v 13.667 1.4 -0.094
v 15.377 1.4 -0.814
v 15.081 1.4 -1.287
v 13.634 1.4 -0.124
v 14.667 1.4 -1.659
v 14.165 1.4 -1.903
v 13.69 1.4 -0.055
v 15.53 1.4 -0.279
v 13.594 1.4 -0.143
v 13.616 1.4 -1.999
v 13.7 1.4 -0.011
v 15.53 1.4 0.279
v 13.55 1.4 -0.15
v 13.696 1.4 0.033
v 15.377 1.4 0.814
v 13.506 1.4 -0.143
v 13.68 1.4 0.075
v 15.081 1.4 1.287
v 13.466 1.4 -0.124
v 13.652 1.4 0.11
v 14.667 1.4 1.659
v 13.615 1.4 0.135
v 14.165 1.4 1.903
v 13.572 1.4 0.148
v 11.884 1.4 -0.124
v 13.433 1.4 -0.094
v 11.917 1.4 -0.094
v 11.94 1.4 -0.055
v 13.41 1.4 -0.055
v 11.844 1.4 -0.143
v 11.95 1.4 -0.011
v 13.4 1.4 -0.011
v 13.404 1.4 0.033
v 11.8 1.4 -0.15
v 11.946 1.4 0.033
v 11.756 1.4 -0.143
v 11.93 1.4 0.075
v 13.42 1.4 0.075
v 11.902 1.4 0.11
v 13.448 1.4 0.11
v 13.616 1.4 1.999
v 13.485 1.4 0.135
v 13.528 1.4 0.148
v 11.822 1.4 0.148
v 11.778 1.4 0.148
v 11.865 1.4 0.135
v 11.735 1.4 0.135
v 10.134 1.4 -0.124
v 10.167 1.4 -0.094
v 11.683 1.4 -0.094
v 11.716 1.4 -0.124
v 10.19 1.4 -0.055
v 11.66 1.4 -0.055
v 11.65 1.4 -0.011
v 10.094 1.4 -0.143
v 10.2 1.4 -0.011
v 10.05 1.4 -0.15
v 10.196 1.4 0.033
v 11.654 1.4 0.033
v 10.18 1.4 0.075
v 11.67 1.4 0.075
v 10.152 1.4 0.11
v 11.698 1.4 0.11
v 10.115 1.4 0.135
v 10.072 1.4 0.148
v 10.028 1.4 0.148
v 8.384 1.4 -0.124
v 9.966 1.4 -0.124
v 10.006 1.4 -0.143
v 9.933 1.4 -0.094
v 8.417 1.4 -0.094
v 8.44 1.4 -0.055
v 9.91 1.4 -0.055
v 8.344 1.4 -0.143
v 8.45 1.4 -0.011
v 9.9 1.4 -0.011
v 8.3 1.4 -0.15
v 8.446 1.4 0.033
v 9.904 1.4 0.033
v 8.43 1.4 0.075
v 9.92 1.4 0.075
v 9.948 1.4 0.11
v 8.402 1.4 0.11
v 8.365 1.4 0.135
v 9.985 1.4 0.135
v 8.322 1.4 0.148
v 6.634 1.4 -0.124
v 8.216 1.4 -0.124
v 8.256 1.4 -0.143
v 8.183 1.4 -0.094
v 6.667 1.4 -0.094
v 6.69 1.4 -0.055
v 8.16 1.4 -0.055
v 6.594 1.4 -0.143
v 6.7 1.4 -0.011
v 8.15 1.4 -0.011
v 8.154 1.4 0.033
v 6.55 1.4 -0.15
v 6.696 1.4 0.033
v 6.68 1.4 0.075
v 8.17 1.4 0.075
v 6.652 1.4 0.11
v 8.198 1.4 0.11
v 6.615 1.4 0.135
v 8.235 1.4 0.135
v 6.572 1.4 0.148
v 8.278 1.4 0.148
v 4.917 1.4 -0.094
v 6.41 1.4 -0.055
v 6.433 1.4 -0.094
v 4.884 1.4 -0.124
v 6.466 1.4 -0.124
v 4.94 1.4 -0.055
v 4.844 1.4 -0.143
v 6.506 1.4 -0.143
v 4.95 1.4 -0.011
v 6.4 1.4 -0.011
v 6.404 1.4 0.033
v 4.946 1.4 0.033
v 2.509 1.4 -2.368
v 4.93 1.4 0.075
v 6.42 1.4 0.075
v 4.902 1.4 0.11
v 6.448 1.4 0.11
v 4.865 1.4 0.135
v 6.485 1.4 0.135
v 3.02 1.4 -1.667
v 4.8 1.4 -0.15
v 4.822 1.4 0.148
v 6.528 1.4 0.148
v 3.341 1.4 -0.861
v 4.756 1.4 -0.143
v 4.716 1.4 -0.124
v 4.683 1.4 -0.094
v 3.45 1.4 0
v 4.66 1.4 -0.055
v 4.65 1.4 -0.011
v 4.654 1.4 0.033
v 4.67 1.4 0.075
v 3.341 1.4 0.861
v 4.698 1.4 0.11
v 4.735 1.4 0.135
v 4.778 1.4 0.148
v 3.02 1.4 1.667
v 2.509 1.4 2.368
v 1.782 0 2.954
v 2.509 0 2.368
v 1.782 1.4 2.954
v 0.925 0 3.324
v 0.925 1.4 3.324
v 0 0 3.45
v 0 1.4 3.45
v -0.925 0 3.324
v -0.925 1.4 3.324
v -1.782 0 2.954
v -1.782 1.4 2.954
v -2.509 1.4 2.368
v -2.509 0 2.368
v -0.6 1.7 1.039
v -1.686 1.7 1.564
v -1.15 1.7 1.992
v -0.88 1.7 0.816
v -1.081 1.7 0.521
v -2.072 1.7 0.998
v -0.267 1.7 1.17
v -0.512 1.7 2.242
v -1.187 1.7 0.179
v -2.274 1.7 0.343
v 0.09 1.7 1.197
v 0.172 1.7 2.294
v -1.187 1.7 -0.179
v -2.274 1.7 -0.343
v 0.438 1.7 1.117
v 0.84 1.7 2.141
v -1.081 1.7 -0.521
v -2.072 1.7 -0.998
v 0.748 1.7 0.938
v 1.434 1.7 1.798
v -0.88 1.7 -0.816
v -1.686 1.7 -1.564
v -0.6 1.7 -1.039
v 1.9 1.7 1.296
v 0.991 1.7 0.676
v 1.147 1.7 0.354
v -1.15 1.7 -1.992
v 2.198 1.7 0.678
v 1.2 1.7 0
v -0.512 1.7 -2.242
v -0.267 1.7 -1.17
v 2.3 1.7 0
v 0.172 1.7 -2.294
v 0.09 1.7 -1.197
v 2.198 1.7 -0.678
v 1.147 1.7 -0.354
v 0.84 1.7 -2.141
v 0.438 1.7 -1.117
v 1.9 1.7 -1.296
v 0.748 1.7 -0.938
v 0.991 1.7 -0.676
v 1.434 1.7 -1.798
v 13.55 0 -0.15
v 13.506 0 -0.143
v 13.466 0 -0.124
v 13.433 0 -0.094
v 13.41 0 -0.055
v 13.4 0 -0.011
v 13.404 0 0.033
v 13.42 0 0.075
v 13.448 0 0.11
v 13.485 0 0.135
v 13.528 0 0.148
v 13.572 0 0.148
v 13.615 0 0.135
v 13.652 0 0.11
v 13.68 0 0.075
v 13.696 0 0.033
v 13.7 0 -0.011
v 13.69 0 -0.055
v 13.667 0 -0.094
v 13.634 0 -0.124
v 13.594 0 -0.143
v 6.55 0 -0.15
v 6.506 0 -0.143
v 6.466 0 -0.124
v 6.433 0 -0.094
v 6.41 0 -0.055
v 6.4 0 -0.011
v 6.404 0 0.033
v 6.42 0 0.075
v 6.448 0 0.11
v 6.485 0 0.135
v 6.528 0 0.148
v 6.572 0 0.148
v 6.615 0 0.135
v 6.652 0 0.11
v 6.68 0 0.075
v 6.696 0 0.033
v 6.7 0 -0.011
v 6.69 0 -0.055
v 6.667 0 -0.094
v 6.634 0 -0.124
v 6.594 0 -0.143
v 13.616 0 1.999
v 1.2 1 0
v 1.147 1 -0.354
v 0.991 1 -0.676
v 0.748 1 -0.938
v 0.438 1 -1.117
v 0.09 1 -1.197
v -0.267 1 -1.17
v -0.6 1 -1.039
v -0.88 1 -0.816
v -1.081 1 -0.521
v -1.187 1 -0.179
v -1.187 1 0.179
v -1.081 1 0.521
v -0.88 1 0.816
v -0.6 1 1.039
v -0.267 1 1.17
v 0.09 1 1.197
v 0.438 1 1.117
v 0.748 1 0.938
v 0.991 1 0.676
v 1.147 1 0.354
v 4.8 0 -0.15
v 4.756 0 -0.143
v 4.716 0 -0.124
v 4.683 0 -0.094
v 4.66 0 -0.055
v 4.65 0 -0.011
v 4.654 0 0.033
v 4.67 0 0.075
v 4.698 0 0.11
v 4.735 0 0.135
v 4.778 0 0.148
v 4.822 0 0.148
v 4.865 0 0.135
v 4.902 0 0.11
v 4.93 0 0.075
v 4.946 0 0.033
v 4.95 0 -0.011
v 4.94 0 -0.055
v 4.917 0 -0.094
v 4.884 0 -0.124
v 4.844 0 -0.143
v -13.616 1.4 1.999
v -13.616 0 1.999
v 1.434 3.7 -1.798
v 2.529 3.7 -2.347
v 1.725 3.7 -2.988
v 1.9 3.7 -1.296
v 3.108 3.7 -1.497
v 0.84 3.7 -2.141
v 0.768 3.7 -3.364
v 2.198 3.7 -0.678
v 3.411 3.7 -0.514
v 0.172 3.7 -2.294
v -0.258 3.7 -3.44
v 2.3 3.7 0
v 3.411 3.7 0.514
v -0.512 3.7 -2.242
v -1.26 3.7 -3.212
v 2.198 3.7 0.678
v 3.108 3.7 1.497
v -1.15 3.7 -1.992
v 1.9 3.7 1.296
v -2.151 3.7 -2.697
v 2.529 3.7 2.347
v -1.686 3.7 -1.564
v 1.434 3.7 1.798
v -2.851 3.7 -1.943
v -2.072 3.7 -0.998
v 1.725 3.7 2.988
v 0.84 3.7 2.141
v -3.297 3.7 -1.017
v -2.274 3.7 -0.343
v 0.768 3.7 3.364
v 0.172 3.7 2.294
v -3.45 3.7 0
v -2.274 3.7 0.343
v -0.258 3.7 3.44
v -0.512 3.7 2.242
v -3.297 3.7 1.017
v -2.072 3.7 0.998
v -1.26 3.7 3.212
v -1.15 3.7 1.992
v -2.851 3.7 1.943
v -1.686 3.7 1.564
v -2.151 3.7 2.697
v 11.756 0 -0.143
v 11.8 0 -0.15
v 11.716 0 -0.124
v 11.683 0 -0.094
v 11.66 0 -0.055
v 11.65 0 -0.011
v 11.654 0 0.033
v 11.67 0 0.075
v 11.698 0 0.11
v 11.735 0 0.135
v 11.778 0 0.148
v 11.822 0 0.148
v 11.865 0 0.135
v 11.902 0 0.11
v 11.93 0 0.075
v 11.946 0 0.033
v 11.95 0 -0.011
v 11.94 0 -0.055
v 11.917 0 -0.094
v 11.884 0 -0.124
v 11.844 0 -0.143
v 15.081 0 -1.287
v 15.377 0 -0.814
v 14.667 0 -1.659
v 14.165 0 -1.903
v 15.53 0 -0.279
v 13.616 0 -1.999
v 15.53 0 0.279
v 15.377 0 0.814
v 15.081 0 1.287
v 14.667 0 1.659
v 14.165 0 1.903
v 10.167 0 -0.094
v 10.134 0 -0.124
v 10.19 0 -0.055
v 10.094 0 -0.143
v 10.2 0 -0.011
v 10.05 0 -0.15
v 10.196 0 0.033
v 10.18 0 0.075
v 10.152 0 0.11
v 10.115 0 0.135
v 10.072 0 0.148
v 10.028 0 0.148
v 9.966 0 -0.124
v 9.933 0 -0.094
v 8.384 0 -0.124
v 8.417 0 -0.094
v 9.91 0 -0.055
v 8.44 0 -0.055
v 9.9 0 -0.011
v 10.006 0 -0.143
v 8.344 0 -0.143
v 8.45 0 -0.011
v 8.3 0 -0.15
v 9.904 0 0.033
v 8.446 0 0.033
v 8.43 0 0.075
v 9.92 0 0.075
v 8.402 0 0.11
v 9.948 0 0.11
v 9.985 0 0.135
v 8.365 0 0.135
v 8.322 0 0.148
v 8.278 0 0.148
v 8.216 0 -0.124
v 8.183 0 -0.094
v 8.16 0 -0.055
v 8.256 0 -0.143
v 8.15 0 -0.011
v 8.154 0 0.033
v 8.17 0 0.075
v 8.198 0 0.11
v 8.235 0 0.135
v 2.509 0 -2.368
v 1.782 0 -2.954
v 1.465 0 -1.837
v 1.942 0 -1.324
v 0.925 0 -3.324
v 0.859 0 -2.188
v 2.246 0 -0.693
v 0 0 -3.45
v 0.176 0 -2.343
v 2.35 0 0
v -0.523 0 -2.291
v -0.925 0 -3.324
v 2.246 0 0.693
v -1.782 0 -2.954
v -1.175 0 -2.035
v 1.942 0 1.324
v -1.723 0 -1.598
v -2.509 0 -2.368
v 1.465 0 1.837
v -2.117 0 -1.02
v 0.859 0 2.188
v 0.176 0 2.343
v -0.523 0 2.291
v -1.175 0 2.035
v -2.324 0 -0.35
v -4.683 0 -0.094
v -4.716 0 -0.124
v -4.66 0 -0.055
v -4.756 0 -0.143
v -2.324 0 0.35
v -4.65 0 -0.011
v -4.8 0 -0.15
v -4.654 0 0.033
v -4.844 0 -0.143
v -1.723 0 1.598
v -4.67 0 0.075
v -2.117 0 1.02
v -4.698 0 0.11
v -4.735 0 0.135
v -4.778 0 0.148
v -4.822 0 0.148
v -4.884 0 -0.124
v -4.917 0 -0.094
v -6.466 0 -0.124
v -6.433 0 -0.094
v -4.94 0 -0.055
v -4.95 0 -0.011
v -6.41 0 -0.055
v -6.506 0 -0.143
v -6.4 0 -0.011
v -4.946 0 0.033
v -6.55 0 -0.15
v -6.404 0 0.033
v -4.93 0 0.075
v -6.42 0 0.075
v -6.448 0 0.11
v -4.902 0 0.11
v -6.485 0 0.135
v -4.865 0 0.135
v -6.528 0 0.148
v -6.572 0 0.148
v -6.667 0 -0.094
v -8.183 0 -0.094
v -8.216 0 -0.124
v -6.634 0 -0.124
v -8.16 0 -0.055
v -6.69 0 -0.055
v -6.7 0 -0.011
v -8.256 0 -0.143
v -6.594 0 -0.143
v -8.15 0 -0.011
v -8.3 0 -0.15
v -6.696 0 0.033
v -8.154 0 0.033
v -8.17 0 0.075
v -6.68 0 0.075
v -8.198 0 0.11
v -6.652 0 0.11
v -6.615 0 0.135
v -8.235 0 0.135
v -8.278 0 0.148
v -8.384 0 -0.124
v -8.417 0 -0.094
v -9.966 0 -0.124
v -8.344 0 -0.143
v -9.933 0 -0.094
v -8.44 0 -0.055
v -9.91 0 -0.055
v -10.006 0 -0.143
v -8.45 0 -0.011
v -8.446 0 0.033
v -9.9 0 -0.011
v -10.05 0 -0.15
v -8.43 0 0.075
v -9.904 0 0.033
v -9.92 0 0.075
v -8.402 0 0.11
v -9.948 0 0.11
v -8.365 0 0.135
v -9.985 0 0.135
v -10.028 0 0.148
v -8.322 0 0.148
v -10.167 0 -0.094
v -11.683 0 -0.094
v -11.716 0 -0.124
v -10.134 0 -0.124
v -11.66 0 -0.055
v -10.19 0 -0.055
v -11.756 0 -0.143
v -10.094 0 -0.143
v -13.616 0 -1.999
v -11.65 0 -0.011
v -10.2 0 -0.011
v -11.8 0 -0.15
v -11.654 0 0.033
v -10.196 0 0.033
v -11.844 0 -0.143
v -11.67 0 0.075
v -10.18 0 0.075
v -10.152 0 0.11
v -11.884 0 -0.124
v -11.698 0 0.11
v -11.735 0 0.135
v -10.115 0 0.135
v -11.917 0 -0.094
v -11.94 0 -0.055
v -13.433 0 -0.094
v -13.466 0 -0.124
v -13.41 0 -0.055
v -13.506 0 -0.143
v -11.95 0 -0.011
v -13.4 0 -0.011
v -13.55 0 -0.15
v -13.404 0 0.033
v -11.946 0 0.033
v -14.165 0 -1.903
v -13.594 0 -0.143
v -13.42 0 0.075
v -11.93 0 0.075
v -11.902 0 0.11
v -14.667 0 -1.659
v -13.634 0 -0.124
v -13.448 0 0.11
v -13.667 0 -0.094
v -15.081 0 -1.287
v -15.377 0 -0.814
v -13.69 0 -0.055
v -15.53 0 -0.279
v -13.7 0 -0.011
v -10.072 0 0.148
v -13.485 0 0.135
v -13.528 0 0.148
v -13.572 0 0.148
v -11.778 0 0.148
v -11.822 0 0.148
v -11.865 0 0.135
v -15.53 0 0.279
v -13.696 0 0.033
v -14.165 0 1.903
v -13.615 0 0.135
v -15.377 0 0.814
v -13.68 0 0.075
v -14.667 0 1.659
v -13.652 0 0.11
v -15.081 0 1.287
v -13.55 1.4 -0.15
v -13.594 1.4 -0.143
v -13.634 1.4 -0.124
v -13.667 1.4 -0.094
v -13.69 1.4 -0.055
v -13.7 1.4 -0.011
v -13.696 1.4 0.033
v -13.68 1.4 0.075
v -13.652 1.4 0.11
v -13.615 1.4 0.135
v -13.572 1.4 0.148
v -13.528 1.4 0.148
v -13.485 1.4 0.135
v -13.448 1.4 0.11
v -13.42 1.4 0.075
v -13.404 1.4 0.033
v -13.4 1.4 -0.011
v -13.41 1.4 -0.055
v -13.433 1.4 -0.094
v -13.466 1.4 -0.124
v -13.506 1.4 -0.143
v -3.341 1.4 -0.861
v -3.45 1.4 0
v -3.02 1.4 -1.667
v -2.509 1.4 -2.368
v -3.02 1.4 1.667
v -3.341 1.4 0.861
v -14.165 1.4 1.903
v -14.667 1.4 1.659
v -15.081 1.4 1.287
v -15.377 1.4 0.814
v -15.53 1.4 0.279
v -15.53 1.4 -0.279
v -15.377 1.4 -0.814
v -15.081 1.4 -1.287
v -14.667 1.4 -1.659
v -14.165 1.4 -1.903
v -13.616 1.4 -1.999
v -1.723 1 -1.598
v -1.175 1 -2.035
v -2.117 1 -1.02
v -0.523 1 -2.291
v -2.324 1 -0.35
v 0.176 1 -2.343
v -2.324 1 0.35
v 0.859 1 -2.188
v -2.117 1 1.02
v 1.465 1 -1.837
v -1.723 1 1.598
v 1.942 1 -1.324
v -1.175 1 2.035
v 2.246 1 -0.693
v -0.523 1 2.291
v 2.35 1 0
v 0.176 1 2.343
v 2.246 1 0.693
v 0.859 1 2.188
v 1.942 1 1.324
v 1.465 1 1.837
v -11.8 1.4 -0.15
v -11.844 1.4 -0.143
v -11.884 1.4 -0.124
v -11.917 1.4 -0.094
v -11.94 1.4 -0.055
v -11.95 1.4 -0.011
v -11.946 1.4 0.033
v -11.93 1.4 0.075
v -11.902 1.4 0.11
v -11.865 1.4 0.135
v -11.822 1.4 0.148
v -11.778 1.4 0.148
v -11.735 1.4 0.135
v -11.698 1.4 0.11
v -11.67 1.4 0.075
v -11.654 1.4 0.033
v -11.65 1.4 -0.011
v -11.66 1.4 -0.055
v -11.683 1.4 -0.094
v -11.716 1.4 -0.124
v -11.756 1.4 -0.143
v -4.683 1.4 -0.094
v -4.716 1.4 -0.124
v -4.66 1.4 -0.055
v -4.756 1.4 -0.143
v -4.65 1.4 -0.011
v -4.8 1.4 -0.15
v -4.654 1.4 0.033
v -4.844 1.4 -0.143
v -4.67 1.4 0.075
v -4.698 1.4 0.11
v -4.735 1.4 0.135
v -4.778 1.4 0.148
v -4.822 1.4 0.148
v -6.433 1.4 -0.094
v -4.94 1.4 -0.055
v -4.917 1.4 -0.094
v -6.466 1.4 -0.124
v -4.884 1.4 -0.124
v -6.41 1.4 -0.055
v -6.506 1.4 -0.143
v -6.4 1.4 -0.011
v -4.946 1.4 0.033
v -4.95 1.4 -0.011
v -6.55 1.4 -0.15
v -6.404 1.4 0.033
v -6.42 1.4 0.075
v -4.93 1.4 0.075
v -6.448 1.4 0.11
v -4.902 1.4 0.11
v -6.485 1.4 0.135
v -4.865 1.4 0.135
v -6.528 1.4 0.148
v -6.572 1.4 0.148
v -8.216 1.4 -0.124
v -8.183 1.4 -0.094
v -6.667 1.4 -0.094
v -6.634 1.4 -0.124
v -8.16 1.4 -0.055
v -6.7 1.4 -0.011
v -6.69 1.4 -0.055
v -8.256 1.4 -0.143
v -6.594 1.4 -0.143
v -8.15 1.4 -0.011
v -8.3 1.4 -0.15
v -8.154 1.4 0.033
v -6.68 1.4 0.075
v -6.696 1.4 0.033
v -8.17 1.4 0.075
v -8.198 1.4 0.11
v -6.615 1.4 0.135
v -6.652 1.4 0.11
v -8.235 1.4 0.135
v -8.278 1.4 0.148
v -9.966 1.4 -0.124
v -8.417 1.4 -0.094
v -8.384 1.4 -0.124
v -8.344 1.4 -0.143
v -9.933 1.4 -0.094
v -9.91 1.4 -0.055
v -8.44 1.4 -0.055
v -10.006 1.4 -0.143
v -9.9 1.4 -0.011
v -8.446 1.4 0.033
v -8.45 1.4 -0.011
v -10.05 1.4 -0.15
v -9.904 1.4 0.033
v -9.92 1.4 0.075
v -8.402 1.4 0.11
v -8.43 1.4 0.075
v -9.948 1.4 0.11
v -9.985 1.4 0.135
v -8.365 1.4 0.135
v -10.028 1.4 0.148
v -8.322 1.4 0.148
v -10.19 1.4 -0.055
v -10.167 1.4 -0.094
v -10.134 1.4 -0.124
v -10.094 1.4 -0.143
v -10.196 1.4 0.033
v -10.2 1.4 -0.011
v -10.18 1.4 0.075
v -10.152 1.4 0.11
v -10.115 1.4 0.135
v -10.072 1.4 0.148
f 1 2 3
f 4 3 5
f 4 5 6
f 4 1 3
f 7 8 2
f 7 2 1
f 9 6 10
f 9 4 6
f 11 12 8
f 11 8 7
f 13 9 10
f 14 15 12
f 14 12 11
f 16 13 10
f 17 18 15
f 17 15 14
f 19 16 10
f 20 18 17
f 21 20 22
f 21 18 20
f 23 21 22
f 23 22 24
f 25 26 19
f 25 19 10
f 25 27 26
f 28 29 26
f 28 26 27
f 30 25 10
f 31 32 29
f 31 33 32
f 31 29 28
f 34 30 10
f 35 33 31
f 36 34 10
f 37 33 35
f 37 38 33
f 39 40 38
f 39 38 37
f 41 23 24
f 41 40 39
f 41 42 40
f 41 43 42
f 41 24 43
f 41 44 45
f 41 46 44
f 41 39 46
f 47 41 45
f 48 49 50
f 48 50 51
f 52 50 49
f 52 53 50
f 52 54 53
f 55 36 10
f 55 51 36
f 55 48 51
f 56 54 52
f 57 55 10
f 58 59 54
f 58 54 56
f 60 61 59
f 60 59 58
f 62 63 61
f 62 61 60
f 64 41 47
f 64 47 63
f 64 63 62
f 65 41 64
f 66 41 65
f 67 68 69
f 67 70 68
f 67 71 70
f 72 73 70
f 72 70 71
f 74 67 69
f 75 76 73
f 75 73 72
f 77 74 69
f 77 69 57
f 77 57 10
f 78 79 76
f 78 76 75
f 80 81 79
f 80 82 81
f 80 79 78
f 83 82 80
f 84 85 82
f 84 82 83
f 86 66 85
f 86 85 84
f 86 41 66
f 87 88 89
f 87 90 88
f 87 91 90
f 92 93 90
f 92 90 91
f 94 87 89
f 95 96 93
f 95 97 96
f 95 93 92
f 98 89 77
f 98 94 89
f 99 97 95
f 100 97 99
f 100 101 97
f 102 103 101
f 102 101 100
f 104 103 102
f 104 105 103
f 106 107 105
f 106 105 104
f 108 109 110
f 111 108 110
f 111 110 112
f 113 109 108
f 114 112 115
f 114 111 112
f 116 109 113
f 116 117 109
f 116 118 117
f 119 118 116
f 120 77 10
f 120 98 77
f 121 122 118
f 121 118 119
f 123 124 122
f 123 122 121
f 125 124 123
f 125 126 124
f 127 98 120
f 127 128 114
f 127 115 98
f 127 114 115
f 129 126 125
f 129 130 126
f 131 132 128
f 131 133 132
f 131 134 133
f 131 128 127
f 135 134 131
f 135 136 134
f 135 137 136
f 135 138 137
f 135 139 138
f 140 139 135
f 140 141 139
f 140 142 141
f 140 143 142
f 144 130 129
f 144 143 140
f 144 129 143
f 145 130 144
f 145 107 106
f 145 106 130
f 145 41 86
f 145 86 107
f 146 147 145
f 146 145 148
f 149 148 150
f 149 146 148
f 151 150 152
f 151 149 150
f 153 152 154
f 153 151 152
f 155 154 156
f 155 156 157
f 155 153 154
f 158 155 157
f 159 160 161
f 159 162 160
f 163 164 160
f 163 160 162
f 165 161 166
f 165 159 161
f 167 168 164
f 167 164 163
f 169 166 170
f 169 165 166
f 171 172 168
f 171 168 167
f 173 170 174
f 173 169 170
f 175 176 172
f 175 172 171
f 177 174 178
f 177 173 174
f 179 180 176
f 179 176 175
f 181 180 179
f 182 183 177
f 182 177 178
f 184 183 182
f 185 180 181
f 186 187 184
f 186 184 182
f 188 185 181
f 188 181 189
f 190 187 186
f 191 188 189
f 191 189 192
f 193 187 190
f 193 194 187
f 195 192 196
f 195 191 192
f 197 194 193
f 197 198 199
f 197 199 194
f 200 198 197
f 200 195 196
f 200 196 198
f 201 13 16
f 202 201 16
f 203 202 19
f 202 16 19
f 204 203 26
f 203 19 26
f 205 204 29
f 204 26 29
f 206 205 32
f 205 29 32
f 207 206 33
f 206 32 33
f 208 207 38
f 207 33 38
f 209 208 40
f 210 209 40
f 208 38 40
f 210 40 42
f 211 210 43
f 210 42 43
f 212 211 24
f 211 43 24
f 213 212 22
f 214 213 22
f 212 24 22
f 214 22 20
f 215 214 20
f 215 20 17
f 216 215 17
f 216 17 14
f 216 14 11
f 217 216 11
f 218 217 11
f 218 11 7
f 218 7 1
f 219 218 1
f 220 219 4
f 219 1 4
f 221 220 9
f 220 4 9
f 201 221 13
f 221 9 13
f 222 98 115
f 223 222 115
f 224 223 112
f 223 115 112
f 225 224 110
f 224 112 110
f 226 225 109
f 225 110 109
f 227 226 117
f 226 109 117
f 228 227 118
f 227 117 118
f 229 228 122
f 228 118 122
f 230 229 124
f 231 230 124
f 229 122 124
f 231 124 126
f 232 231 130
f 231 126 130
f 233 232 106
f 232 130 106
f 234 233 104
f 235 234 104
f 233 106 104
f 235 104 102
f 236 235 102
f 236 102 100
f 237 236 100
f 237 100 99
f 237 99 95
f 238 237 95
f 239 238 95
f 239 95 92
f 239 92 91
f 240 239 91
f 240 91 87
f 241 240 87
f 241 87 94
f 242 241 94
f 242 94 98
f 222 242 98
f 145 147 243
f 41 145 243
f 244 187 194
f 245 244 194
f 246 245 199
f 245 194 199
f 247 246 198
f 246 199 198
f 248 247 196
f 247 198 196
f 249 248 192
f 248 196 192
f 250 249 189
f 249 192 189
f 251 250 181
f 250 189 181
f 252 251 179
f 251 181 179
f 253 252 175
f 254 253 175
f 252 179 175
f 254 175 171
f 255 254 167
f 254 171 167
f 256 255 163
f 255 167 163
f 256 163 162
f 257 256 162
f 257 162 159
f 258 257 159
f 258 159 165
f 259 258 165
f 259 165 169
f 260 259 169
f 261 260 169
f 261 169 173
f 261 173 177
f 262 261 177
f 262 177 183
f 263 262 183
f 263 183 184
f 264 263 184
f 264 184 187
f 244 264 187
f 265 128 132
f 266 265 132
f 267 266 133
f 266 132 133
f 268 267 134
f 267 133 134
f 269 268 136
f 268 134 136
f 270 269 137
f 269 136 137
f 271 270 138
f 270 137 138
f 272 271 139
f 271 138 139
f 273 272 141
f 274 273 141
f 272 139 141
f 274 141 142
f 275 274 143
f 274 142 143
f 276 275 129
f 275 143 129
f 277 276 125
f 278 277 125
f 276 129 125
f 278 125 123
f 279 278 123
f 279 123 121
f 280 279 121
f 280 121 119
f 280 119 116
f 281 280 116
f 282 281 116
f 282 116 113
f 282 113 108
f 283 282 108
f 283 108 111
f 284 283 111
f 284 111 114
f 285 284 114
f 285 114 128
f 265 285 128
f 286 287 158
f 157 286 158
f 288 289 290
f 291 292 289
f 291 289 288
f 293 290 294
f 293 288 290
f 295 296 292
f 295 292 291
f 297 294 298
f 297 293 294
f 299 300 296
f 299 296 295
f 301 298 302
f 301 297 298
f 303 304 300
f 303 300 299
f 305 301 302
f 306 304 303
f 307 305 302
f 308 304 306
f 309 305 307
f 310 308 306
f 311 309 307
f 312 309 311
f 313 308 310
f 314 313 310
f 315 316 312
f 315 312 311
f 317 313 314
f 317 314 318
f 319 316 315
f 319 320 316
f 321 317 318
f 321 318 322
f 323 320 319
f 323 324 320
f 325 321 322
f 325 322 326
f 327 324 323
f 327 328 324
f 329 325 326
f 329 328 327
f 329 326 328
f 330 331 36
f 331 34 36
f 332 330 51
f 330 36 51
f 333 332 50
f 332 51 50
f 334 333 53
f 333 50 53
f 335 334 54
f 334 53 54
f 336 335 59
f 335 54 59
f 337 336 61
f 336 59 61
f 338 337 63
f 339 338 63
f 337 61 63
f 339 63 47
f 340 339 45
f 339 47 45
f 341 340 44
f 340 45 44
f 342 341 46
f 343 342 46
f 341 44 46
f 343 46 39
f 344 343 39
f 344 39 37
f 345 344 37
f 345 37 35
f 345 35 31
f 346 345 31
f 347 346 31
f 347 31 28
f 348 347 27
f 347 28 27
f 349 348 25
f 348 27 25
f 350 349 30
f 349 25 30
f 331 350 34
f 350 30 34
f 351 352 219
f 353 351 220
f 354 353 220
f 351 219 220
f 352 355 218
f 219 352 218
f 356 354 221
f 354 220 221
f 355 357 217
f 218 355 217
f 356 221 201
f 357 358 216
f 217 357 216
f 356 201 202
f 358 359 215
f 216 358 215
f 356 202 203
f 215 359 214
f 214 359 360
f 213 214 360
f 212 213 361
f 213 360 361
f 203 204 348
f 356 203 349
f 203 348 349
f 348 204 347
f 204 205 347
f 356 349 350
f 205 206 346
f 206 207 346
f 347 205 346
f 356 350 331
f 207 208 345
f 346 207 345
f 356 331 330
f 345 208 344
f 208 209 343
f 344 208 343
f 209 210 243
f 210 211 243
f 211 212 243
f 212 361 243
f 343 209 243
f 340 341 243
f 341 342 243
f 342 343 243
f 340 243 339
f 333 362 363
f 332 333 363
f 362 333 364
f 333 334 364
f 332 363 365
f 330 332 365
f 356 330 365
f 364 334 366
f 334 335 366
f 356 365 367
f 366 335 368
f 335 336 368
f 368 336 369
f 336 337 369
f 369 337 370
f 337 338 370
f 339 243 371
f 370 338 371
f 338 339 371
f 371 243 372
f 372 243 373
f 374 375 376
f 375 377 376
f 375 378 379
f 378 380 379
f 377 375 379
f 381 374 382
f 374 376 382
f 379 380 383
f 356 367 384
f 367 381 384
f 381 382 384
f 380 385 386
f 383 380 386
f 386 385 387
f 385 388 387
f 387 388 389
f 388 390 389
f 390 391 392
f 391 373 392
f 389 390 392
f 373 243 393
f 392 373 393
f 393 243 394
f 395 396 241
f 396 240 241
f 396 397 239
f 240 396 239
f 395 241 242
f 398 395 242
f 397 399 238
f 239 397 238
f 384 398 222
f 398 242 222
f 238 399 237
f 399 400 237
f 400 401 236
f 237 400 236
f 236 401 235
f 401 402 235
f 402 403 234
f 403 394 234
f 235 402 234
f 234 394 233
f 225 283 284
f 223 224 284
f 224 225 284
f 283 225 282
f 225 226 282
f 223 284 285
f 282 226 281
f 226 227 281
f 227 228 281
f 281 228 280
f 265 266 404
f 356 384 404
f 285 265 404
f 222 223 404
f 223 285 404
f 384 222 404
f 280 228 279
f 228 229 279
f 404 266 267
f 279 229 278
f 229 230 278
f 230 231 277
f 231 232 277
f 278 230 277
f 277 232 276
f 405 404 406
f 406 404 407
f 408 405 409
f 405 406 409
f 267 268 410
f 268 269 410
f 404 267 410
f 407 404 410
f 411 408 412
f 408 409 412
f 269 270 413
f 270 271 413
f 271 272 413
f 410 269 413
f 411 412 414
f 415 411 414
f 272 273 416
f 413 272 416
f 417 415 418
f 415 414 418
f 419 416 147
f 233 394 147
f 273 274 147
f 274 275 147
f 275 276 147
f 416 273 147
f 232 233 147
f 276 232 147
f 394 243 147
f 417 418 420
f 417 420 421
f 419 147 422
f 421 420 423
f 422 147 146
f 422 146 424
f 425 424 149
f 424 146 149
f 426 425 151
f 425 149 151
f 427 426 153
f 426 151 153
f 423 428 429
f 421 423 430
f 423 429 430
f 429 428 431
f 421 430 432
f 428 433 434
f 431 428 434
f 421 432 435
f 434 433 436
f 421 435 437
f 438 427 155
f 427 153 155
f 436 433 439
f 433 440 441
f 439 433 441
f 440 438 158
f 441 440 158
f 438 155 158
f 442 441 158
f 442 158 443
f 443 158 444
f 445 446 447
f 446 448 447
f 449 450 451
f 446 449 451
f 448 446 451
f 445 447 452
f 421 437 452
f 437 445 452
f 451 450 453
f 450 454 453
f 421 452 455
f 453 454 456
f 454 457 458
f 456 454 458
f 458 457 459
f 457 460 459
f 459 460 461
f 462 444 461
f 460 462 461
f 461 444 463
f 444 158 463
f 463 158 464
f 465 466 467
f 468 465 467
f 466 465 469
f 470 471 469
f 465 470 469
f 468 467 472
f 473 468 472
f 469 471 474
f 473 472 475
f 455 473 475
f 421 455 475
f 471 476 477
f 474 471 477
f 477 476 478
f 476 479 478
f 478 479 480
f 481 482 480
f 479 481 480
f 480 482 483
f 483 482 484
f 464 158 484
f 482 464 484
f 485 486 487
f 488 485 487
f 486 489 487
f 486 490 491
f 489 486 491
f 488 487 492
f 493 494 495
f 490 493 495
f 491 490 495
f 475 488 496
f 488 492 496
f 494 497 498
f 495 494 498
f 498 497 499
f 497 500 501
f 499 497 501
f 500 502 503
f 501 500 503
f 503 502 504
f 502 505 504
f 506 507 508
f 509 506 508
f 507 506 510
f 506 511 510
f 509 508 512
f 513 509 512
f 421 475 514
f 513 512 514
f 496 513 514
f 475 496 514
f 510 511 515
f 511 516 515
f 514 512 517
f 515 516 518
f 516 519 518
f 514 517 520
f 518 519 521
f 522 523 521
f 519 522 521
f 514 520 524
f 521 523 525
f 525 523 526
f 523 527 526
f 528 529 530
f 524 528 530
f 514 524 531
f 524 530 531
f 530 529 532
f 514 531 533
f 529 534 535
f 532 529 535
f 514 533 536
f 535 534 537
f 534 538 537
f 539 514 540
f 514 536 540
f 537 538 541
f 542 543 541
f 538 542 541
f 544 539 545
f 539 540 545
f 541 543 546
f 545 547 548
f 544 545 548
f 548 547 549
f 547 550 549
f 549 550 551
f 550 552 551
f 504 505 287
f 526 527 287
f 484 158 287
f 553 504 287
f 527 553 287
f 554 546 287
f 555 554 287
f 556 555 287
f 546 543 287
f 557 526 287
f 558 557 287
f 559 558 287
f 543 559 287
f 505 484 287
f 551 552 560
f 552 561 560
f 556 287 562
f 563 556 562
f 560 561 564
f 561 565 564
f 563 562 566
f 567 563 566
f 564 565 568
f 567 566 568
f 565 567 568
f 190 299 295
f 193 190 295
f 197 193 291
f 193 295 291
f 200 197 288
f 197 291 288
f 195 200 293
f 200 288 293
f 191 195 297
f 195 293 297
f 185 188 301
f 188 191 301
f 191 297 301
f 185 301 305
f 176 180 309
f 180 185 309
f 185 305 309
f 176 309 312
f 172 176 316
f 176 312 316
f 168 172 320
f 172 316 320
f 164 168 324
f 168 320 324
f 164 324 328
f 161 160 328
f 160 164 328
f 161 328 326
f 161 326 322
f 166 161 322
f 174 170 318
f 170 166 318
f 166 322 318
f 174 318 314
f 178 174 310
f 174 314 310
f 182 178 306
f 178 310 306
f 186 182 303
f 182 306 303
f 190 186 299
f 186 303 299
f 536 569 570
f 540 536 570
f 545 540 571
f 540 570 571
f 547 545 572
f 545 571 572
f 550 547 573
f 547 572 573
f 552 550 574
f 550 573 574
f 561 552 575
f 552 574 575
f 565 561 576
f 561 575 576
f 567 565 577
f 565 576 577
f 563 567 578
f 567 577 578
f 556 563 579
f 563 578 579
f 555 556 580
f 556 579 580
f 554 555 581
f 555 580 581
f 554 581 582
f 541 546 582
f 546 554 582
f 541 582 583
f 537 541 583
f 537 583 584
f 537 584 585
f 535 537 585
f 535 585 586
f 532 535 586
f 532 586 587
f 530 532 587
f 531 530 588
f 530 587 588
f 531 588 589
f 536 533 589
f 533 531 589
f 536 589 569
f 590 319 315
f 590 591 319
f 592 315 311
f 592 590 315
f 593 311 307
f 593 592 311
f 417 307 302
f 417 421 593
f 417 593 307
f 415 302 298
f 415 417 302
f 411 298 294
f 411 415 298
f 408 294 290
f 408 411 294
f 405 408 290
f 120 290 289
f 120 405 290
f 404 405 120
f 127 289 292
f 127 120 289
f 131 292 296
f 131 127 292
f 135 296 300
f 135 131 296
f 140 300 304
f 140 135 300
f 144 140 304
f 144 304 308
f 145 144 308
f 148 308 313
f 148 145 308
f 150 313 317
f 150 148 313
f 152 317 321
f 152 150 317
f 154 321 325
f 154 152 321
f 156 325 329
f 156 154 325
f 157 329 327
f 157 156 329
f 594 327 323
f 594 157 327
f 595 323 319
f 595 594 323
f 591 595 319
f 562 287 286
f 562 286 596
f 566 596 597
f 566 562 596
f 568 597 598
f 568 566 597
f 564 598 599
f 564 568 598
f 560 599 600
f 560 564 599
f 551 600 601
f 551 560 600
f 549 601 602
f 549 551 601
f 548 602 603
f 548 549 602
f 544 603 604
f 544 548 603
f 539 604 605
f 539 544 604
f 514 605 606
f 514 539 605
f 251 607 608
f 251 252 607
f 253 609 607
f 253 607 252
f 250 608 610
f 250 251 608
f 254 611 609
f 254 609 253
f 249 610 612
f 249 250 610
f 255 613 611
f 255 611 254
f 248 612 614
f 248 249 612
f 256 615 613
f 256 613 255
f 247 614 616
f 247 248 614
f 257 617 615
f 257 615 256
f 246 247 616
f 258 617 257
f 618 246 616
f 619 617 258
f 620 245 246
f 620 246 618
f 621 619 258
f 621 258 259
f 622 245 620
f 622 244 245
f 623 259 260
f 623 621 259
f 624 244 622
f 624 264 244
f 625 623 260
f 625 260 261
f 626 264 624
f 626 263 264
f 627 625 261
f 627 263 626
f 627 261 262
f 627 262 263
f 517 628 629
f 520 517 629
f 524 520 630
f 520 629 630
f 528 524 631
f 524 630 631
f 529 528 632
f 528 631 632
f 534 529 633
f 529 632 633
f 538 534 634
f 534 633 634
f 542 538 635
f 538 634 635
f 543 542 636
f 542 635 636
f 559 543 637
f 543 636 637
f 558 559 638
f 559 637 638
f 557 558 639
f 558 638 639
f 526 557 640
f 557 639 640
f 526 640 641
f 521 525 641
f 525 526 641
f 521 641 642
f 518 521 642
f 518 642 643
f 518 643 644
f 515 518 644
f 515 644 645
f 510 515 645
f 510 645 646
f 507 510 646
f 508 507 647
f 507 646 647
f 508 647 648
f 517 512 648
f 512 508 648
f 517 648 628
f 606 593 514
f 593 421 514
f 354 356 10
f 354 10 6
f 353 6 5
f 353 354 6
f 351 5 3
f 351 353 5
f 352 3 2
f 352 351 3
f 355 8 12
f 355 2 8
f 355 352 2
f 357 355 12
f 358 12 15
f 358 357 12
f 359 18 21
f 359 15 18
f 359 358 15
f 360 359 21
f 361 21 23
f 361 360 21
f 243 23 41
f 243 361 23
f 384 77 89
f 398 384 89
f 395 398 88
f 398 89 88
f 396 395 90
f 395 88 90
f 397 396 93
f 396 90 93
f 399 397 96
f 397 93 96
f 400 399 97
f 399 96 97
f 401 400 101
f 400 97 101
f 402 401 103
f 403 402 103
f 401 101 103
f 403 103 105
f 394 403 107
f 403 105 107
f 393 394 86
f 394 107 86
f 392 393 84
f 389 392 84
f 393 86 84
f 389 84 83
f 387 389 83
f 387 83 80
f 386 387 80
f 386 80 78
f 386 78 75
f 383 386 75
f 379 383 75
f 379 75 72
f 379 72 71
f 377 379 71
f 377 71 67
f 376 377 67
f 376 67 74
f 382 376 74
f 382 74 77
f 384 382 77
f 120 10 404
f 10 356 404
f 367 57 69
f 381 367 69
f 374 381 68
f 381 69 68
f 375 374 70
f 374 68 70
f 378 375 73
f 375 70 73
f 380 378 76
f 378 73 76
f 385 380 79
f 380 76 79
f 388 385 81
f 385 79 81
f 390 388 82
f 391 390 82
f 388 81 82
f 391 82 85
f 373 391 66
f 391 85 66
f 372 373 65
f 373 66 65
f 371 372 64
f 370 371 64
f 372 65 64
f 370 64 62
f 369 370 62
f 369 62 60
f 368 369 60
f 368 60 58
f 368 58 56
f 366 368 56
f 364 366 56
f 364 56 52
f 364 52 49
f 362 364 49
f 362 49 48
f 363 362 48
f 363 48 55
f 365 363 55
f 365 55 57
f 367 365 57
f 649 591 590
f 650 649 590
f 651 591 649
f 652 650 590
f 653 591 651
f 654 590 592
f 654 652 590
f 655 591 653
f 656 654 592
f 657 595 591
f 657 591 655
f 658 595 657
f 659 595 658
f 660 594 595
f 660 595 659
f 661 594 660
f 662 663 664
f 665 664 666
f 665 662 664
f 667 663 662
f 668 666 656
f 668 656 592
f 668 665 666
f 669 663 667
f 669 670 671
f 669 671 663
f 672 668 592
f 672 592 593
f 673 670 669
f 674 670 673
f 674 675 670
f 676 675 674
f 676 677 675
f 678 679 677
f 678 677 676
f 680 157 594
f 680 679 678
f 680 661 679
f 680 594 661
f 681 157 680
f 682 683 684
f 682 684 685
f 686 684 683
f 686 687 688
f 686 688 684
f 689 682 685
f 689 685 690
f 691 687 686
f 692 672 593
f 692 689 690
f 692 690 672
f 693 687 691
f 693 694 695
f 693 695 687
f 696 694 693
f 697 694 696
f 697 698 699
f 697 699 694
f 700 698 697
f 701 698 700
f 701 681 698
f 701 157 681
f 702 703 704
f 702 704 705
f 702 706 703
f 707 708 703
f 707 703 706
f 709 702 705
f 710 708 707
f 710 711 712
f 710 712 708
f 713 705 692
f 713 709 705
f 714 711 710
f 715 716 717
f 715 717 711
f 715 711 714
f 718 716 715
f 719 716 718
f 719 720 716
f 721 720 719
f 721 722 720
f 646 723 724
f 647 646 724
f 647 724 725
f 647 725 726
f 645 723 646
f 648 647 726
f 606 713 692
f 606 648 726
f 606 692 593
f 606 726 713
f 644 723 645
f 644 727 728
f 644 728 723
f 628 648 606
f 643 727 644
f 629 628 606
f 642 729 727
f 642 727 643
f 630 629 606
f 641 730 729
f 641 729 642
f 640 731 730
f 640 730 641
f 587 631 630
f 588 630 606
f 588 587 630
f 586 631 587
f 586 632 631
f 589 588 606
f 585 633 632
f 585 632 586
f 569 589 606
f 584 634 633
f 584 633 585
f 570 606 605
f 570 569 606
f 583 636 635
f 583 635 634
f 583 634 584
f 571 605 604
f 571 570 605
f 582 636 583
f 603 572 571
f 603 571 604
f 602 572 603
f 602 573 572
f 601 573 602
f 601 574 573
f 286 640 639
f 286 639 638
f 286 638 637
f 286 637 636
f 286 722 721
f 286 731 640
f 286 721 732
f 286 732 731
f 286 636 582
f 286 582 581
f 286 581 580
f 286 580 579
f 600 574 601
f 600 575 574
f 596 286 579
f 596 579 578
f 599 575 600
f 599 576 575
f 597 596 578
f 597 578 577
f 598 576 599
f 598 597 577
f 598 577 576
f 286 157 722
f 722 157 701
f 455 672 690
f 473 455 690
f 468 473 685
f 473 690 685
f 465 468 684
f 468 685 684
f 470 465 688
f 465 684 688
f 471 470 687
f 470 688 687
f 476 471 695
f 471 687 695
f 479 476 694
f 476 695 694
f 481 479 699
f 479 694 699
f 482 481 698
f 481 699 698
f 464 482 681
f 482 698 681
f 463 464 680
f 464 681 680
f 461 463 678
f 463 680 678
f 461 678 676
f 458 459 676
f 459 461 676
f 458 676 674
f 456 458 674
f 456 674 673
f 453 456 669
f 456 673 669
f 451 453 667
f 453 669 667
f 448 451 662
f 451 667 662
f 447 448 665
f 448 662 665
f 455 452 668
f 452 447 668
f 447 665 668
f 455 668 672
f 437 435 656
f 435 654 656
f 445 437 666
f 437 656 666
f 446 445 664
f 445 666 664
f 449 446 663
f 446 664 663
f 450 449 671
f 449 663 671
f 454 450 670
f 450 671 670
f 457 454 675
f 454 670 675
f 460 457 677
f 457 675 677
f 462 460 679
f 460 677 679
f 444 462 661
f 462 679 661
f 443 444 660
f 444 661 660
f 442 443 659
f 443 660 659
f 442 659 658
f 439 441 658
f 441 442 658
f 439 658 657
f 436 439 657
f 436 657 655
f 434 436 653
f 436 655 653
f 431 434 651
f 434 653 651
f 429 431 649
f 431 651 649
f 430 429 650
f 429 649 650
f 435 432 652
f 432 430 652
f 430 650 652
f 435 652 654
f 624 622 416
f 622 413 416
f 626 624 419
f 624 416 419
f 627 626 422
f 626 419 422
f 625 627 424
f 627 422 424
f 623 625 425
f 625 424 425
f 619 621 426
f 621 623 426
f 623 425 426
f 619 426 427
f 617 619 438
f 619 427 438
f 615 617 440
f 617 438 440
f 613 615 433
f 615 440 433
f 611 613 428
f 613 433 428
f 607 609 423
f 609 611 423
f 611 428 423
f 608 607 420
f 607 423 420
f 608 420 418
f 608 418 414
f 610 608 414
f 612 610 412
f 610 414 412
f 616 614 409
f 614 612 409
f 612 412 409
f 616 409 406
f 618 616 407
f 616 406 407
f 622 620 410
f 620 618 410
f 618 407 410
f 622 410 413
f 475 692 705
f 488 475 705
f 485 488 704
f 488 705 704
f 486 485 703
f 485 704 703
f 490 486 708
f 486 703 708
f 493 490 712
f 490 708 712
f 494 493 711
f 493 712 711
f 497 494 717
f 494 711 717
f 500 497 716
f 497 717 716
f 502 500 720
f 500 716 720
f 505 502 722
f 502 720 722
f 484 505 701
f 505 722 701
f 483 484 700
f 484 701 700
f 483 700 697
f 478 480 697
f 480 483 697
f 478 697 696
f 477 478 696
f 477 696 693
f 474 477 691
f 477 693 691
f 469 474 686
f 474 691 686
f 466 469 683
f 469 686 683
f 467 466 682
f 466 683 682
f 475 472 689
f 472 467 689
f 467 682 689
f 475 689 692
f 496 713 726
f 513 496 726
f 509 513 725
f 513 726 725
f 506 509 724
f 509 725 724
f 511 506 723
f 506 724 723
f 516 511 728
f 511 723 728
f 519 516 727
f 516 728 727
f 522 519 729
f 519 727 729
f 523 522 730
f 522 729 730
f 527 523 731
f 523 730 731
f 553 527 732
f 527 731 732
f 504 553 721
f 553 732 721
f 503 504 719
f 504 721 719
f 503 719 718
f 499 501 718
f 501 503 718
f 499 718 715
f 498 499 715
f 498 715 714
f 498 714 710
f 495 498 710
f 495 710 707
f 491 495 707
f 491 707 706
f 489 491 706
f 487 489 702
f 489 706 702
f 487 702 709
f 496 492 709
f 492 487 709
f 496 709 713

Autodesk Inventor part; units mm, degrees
ref_plane "YZ Plane" through (0, 0, 0) normal (1, 0, 0) x (0, 1, 0)
ref_plane "XZ Plane" through (0, 0, 0) normal (0, 1, 0) x (-1, 0, 0)
sketch "Sketch1" plane through (0, 0, 0) normal (0, 1, 0) x (-1, 0, 0)
  circle A0 centre (0, 0) radius 3.45
  line L0 (0, 0) -> (-13.55, 0) construction
  line L1 (-0.0814, 2.4486) -> (-13.6164, 1.9989)
  line L2 (-13.6164, -1.9989) -> (-0.0814, -2.4486)
  arc A1 (-0.0814, -2.4486) -> (-0.0814, 2.4486) centre (0, 0) ccw
  arc A2 (-13.6164, 1.9989) -> (-13.6164, -1.9989) centre (-13.55, 0) ccw
  point P0 (-6.775, 0)
  point P1 (-15.55, 0)
  point P2 (3.45, 0)
  dimension "d0" = 6.9
  dimension "d2" = 4
  dimension "d3" = 1
  dimension "d4" = 19
extrude "Extrusion1" add sketch "Sketch1" along normal blind 1.4
extrude "Extrusion2" add sketch "Sketch1" along normal blind 3.7 contours A0 L2 A1 L1 | L1 A1 L2 A0
sketch "Sketch2" plane through (0, 3.7, 0) normal (0, 1, 0) x (1, 0, 0)
  circle A0 centre (0, 0) radius 3.45 construction
  circle A1 centre (0, 0) radius 1.2
  dimension "d9" = 2.4
extrude "Extrusion3" cut sketch "Sketch2" against normal through all
sketch "Sketch3" plane through (0, 3.7, 0) normal (0, 1, 0) x (1, 0, 0)
  circle A0 centre (0, 0) radius 3.45 construction
  circle A1 centre (0, 0) radius 2.3
  dimension "d12" = 4.6
extrude "Extrusion4" cut sketch "Sketch3" against normal blind 2
sketch "Sketch4" plane through (0, 0, 0) normal (0, -1, 0) x (1, 0, 0)
  arc A0 (2.509, 2.368) -> (2.509, -2.368) centre (0, 0) ccw construction
  circle A1 centre (0, 0) radius 2.35
  dimension "d15" = 1.1
extrude "Extrusion5" cut sketch "Sketch4" against normal blind 1
sketch "Sketch5" plane through (0, 0, 0) normal (0, -1, 0) x (1, 0, 0)
  arc A0 (13.6164, -1.9989) -> (13.6164, 1.9989) centre (13.55, 0) ccw construction
  line L0 (13.55, 0) -> (10.05, 0)
  line L1 (10.05, 0) -> (6.55, 0)
  line L2 (6.55, 0) -> (3.05, 0)
  point P0 (8.3, 0)
  point P1 (4.8, 0)
  point P2 (11.8, 0)
  point P3 (4.8, 0)
  dimension "d18" = 3.5
hole "Hole1" at (13.55, 0, 0) at (10.05, 0, 0) at (8.3, 0, 0) at (6.55, 0, 0) at (4.8, 0, 0) at (11.8, 0, 0) direction (0, 1, 0) diameter 0.3 end through all
mirror "Mirror1" about plane through (0, 0, 0) normal (1, 0, 0)
properties part number "SG90Horn2" material "PC/ABS Plastic"
